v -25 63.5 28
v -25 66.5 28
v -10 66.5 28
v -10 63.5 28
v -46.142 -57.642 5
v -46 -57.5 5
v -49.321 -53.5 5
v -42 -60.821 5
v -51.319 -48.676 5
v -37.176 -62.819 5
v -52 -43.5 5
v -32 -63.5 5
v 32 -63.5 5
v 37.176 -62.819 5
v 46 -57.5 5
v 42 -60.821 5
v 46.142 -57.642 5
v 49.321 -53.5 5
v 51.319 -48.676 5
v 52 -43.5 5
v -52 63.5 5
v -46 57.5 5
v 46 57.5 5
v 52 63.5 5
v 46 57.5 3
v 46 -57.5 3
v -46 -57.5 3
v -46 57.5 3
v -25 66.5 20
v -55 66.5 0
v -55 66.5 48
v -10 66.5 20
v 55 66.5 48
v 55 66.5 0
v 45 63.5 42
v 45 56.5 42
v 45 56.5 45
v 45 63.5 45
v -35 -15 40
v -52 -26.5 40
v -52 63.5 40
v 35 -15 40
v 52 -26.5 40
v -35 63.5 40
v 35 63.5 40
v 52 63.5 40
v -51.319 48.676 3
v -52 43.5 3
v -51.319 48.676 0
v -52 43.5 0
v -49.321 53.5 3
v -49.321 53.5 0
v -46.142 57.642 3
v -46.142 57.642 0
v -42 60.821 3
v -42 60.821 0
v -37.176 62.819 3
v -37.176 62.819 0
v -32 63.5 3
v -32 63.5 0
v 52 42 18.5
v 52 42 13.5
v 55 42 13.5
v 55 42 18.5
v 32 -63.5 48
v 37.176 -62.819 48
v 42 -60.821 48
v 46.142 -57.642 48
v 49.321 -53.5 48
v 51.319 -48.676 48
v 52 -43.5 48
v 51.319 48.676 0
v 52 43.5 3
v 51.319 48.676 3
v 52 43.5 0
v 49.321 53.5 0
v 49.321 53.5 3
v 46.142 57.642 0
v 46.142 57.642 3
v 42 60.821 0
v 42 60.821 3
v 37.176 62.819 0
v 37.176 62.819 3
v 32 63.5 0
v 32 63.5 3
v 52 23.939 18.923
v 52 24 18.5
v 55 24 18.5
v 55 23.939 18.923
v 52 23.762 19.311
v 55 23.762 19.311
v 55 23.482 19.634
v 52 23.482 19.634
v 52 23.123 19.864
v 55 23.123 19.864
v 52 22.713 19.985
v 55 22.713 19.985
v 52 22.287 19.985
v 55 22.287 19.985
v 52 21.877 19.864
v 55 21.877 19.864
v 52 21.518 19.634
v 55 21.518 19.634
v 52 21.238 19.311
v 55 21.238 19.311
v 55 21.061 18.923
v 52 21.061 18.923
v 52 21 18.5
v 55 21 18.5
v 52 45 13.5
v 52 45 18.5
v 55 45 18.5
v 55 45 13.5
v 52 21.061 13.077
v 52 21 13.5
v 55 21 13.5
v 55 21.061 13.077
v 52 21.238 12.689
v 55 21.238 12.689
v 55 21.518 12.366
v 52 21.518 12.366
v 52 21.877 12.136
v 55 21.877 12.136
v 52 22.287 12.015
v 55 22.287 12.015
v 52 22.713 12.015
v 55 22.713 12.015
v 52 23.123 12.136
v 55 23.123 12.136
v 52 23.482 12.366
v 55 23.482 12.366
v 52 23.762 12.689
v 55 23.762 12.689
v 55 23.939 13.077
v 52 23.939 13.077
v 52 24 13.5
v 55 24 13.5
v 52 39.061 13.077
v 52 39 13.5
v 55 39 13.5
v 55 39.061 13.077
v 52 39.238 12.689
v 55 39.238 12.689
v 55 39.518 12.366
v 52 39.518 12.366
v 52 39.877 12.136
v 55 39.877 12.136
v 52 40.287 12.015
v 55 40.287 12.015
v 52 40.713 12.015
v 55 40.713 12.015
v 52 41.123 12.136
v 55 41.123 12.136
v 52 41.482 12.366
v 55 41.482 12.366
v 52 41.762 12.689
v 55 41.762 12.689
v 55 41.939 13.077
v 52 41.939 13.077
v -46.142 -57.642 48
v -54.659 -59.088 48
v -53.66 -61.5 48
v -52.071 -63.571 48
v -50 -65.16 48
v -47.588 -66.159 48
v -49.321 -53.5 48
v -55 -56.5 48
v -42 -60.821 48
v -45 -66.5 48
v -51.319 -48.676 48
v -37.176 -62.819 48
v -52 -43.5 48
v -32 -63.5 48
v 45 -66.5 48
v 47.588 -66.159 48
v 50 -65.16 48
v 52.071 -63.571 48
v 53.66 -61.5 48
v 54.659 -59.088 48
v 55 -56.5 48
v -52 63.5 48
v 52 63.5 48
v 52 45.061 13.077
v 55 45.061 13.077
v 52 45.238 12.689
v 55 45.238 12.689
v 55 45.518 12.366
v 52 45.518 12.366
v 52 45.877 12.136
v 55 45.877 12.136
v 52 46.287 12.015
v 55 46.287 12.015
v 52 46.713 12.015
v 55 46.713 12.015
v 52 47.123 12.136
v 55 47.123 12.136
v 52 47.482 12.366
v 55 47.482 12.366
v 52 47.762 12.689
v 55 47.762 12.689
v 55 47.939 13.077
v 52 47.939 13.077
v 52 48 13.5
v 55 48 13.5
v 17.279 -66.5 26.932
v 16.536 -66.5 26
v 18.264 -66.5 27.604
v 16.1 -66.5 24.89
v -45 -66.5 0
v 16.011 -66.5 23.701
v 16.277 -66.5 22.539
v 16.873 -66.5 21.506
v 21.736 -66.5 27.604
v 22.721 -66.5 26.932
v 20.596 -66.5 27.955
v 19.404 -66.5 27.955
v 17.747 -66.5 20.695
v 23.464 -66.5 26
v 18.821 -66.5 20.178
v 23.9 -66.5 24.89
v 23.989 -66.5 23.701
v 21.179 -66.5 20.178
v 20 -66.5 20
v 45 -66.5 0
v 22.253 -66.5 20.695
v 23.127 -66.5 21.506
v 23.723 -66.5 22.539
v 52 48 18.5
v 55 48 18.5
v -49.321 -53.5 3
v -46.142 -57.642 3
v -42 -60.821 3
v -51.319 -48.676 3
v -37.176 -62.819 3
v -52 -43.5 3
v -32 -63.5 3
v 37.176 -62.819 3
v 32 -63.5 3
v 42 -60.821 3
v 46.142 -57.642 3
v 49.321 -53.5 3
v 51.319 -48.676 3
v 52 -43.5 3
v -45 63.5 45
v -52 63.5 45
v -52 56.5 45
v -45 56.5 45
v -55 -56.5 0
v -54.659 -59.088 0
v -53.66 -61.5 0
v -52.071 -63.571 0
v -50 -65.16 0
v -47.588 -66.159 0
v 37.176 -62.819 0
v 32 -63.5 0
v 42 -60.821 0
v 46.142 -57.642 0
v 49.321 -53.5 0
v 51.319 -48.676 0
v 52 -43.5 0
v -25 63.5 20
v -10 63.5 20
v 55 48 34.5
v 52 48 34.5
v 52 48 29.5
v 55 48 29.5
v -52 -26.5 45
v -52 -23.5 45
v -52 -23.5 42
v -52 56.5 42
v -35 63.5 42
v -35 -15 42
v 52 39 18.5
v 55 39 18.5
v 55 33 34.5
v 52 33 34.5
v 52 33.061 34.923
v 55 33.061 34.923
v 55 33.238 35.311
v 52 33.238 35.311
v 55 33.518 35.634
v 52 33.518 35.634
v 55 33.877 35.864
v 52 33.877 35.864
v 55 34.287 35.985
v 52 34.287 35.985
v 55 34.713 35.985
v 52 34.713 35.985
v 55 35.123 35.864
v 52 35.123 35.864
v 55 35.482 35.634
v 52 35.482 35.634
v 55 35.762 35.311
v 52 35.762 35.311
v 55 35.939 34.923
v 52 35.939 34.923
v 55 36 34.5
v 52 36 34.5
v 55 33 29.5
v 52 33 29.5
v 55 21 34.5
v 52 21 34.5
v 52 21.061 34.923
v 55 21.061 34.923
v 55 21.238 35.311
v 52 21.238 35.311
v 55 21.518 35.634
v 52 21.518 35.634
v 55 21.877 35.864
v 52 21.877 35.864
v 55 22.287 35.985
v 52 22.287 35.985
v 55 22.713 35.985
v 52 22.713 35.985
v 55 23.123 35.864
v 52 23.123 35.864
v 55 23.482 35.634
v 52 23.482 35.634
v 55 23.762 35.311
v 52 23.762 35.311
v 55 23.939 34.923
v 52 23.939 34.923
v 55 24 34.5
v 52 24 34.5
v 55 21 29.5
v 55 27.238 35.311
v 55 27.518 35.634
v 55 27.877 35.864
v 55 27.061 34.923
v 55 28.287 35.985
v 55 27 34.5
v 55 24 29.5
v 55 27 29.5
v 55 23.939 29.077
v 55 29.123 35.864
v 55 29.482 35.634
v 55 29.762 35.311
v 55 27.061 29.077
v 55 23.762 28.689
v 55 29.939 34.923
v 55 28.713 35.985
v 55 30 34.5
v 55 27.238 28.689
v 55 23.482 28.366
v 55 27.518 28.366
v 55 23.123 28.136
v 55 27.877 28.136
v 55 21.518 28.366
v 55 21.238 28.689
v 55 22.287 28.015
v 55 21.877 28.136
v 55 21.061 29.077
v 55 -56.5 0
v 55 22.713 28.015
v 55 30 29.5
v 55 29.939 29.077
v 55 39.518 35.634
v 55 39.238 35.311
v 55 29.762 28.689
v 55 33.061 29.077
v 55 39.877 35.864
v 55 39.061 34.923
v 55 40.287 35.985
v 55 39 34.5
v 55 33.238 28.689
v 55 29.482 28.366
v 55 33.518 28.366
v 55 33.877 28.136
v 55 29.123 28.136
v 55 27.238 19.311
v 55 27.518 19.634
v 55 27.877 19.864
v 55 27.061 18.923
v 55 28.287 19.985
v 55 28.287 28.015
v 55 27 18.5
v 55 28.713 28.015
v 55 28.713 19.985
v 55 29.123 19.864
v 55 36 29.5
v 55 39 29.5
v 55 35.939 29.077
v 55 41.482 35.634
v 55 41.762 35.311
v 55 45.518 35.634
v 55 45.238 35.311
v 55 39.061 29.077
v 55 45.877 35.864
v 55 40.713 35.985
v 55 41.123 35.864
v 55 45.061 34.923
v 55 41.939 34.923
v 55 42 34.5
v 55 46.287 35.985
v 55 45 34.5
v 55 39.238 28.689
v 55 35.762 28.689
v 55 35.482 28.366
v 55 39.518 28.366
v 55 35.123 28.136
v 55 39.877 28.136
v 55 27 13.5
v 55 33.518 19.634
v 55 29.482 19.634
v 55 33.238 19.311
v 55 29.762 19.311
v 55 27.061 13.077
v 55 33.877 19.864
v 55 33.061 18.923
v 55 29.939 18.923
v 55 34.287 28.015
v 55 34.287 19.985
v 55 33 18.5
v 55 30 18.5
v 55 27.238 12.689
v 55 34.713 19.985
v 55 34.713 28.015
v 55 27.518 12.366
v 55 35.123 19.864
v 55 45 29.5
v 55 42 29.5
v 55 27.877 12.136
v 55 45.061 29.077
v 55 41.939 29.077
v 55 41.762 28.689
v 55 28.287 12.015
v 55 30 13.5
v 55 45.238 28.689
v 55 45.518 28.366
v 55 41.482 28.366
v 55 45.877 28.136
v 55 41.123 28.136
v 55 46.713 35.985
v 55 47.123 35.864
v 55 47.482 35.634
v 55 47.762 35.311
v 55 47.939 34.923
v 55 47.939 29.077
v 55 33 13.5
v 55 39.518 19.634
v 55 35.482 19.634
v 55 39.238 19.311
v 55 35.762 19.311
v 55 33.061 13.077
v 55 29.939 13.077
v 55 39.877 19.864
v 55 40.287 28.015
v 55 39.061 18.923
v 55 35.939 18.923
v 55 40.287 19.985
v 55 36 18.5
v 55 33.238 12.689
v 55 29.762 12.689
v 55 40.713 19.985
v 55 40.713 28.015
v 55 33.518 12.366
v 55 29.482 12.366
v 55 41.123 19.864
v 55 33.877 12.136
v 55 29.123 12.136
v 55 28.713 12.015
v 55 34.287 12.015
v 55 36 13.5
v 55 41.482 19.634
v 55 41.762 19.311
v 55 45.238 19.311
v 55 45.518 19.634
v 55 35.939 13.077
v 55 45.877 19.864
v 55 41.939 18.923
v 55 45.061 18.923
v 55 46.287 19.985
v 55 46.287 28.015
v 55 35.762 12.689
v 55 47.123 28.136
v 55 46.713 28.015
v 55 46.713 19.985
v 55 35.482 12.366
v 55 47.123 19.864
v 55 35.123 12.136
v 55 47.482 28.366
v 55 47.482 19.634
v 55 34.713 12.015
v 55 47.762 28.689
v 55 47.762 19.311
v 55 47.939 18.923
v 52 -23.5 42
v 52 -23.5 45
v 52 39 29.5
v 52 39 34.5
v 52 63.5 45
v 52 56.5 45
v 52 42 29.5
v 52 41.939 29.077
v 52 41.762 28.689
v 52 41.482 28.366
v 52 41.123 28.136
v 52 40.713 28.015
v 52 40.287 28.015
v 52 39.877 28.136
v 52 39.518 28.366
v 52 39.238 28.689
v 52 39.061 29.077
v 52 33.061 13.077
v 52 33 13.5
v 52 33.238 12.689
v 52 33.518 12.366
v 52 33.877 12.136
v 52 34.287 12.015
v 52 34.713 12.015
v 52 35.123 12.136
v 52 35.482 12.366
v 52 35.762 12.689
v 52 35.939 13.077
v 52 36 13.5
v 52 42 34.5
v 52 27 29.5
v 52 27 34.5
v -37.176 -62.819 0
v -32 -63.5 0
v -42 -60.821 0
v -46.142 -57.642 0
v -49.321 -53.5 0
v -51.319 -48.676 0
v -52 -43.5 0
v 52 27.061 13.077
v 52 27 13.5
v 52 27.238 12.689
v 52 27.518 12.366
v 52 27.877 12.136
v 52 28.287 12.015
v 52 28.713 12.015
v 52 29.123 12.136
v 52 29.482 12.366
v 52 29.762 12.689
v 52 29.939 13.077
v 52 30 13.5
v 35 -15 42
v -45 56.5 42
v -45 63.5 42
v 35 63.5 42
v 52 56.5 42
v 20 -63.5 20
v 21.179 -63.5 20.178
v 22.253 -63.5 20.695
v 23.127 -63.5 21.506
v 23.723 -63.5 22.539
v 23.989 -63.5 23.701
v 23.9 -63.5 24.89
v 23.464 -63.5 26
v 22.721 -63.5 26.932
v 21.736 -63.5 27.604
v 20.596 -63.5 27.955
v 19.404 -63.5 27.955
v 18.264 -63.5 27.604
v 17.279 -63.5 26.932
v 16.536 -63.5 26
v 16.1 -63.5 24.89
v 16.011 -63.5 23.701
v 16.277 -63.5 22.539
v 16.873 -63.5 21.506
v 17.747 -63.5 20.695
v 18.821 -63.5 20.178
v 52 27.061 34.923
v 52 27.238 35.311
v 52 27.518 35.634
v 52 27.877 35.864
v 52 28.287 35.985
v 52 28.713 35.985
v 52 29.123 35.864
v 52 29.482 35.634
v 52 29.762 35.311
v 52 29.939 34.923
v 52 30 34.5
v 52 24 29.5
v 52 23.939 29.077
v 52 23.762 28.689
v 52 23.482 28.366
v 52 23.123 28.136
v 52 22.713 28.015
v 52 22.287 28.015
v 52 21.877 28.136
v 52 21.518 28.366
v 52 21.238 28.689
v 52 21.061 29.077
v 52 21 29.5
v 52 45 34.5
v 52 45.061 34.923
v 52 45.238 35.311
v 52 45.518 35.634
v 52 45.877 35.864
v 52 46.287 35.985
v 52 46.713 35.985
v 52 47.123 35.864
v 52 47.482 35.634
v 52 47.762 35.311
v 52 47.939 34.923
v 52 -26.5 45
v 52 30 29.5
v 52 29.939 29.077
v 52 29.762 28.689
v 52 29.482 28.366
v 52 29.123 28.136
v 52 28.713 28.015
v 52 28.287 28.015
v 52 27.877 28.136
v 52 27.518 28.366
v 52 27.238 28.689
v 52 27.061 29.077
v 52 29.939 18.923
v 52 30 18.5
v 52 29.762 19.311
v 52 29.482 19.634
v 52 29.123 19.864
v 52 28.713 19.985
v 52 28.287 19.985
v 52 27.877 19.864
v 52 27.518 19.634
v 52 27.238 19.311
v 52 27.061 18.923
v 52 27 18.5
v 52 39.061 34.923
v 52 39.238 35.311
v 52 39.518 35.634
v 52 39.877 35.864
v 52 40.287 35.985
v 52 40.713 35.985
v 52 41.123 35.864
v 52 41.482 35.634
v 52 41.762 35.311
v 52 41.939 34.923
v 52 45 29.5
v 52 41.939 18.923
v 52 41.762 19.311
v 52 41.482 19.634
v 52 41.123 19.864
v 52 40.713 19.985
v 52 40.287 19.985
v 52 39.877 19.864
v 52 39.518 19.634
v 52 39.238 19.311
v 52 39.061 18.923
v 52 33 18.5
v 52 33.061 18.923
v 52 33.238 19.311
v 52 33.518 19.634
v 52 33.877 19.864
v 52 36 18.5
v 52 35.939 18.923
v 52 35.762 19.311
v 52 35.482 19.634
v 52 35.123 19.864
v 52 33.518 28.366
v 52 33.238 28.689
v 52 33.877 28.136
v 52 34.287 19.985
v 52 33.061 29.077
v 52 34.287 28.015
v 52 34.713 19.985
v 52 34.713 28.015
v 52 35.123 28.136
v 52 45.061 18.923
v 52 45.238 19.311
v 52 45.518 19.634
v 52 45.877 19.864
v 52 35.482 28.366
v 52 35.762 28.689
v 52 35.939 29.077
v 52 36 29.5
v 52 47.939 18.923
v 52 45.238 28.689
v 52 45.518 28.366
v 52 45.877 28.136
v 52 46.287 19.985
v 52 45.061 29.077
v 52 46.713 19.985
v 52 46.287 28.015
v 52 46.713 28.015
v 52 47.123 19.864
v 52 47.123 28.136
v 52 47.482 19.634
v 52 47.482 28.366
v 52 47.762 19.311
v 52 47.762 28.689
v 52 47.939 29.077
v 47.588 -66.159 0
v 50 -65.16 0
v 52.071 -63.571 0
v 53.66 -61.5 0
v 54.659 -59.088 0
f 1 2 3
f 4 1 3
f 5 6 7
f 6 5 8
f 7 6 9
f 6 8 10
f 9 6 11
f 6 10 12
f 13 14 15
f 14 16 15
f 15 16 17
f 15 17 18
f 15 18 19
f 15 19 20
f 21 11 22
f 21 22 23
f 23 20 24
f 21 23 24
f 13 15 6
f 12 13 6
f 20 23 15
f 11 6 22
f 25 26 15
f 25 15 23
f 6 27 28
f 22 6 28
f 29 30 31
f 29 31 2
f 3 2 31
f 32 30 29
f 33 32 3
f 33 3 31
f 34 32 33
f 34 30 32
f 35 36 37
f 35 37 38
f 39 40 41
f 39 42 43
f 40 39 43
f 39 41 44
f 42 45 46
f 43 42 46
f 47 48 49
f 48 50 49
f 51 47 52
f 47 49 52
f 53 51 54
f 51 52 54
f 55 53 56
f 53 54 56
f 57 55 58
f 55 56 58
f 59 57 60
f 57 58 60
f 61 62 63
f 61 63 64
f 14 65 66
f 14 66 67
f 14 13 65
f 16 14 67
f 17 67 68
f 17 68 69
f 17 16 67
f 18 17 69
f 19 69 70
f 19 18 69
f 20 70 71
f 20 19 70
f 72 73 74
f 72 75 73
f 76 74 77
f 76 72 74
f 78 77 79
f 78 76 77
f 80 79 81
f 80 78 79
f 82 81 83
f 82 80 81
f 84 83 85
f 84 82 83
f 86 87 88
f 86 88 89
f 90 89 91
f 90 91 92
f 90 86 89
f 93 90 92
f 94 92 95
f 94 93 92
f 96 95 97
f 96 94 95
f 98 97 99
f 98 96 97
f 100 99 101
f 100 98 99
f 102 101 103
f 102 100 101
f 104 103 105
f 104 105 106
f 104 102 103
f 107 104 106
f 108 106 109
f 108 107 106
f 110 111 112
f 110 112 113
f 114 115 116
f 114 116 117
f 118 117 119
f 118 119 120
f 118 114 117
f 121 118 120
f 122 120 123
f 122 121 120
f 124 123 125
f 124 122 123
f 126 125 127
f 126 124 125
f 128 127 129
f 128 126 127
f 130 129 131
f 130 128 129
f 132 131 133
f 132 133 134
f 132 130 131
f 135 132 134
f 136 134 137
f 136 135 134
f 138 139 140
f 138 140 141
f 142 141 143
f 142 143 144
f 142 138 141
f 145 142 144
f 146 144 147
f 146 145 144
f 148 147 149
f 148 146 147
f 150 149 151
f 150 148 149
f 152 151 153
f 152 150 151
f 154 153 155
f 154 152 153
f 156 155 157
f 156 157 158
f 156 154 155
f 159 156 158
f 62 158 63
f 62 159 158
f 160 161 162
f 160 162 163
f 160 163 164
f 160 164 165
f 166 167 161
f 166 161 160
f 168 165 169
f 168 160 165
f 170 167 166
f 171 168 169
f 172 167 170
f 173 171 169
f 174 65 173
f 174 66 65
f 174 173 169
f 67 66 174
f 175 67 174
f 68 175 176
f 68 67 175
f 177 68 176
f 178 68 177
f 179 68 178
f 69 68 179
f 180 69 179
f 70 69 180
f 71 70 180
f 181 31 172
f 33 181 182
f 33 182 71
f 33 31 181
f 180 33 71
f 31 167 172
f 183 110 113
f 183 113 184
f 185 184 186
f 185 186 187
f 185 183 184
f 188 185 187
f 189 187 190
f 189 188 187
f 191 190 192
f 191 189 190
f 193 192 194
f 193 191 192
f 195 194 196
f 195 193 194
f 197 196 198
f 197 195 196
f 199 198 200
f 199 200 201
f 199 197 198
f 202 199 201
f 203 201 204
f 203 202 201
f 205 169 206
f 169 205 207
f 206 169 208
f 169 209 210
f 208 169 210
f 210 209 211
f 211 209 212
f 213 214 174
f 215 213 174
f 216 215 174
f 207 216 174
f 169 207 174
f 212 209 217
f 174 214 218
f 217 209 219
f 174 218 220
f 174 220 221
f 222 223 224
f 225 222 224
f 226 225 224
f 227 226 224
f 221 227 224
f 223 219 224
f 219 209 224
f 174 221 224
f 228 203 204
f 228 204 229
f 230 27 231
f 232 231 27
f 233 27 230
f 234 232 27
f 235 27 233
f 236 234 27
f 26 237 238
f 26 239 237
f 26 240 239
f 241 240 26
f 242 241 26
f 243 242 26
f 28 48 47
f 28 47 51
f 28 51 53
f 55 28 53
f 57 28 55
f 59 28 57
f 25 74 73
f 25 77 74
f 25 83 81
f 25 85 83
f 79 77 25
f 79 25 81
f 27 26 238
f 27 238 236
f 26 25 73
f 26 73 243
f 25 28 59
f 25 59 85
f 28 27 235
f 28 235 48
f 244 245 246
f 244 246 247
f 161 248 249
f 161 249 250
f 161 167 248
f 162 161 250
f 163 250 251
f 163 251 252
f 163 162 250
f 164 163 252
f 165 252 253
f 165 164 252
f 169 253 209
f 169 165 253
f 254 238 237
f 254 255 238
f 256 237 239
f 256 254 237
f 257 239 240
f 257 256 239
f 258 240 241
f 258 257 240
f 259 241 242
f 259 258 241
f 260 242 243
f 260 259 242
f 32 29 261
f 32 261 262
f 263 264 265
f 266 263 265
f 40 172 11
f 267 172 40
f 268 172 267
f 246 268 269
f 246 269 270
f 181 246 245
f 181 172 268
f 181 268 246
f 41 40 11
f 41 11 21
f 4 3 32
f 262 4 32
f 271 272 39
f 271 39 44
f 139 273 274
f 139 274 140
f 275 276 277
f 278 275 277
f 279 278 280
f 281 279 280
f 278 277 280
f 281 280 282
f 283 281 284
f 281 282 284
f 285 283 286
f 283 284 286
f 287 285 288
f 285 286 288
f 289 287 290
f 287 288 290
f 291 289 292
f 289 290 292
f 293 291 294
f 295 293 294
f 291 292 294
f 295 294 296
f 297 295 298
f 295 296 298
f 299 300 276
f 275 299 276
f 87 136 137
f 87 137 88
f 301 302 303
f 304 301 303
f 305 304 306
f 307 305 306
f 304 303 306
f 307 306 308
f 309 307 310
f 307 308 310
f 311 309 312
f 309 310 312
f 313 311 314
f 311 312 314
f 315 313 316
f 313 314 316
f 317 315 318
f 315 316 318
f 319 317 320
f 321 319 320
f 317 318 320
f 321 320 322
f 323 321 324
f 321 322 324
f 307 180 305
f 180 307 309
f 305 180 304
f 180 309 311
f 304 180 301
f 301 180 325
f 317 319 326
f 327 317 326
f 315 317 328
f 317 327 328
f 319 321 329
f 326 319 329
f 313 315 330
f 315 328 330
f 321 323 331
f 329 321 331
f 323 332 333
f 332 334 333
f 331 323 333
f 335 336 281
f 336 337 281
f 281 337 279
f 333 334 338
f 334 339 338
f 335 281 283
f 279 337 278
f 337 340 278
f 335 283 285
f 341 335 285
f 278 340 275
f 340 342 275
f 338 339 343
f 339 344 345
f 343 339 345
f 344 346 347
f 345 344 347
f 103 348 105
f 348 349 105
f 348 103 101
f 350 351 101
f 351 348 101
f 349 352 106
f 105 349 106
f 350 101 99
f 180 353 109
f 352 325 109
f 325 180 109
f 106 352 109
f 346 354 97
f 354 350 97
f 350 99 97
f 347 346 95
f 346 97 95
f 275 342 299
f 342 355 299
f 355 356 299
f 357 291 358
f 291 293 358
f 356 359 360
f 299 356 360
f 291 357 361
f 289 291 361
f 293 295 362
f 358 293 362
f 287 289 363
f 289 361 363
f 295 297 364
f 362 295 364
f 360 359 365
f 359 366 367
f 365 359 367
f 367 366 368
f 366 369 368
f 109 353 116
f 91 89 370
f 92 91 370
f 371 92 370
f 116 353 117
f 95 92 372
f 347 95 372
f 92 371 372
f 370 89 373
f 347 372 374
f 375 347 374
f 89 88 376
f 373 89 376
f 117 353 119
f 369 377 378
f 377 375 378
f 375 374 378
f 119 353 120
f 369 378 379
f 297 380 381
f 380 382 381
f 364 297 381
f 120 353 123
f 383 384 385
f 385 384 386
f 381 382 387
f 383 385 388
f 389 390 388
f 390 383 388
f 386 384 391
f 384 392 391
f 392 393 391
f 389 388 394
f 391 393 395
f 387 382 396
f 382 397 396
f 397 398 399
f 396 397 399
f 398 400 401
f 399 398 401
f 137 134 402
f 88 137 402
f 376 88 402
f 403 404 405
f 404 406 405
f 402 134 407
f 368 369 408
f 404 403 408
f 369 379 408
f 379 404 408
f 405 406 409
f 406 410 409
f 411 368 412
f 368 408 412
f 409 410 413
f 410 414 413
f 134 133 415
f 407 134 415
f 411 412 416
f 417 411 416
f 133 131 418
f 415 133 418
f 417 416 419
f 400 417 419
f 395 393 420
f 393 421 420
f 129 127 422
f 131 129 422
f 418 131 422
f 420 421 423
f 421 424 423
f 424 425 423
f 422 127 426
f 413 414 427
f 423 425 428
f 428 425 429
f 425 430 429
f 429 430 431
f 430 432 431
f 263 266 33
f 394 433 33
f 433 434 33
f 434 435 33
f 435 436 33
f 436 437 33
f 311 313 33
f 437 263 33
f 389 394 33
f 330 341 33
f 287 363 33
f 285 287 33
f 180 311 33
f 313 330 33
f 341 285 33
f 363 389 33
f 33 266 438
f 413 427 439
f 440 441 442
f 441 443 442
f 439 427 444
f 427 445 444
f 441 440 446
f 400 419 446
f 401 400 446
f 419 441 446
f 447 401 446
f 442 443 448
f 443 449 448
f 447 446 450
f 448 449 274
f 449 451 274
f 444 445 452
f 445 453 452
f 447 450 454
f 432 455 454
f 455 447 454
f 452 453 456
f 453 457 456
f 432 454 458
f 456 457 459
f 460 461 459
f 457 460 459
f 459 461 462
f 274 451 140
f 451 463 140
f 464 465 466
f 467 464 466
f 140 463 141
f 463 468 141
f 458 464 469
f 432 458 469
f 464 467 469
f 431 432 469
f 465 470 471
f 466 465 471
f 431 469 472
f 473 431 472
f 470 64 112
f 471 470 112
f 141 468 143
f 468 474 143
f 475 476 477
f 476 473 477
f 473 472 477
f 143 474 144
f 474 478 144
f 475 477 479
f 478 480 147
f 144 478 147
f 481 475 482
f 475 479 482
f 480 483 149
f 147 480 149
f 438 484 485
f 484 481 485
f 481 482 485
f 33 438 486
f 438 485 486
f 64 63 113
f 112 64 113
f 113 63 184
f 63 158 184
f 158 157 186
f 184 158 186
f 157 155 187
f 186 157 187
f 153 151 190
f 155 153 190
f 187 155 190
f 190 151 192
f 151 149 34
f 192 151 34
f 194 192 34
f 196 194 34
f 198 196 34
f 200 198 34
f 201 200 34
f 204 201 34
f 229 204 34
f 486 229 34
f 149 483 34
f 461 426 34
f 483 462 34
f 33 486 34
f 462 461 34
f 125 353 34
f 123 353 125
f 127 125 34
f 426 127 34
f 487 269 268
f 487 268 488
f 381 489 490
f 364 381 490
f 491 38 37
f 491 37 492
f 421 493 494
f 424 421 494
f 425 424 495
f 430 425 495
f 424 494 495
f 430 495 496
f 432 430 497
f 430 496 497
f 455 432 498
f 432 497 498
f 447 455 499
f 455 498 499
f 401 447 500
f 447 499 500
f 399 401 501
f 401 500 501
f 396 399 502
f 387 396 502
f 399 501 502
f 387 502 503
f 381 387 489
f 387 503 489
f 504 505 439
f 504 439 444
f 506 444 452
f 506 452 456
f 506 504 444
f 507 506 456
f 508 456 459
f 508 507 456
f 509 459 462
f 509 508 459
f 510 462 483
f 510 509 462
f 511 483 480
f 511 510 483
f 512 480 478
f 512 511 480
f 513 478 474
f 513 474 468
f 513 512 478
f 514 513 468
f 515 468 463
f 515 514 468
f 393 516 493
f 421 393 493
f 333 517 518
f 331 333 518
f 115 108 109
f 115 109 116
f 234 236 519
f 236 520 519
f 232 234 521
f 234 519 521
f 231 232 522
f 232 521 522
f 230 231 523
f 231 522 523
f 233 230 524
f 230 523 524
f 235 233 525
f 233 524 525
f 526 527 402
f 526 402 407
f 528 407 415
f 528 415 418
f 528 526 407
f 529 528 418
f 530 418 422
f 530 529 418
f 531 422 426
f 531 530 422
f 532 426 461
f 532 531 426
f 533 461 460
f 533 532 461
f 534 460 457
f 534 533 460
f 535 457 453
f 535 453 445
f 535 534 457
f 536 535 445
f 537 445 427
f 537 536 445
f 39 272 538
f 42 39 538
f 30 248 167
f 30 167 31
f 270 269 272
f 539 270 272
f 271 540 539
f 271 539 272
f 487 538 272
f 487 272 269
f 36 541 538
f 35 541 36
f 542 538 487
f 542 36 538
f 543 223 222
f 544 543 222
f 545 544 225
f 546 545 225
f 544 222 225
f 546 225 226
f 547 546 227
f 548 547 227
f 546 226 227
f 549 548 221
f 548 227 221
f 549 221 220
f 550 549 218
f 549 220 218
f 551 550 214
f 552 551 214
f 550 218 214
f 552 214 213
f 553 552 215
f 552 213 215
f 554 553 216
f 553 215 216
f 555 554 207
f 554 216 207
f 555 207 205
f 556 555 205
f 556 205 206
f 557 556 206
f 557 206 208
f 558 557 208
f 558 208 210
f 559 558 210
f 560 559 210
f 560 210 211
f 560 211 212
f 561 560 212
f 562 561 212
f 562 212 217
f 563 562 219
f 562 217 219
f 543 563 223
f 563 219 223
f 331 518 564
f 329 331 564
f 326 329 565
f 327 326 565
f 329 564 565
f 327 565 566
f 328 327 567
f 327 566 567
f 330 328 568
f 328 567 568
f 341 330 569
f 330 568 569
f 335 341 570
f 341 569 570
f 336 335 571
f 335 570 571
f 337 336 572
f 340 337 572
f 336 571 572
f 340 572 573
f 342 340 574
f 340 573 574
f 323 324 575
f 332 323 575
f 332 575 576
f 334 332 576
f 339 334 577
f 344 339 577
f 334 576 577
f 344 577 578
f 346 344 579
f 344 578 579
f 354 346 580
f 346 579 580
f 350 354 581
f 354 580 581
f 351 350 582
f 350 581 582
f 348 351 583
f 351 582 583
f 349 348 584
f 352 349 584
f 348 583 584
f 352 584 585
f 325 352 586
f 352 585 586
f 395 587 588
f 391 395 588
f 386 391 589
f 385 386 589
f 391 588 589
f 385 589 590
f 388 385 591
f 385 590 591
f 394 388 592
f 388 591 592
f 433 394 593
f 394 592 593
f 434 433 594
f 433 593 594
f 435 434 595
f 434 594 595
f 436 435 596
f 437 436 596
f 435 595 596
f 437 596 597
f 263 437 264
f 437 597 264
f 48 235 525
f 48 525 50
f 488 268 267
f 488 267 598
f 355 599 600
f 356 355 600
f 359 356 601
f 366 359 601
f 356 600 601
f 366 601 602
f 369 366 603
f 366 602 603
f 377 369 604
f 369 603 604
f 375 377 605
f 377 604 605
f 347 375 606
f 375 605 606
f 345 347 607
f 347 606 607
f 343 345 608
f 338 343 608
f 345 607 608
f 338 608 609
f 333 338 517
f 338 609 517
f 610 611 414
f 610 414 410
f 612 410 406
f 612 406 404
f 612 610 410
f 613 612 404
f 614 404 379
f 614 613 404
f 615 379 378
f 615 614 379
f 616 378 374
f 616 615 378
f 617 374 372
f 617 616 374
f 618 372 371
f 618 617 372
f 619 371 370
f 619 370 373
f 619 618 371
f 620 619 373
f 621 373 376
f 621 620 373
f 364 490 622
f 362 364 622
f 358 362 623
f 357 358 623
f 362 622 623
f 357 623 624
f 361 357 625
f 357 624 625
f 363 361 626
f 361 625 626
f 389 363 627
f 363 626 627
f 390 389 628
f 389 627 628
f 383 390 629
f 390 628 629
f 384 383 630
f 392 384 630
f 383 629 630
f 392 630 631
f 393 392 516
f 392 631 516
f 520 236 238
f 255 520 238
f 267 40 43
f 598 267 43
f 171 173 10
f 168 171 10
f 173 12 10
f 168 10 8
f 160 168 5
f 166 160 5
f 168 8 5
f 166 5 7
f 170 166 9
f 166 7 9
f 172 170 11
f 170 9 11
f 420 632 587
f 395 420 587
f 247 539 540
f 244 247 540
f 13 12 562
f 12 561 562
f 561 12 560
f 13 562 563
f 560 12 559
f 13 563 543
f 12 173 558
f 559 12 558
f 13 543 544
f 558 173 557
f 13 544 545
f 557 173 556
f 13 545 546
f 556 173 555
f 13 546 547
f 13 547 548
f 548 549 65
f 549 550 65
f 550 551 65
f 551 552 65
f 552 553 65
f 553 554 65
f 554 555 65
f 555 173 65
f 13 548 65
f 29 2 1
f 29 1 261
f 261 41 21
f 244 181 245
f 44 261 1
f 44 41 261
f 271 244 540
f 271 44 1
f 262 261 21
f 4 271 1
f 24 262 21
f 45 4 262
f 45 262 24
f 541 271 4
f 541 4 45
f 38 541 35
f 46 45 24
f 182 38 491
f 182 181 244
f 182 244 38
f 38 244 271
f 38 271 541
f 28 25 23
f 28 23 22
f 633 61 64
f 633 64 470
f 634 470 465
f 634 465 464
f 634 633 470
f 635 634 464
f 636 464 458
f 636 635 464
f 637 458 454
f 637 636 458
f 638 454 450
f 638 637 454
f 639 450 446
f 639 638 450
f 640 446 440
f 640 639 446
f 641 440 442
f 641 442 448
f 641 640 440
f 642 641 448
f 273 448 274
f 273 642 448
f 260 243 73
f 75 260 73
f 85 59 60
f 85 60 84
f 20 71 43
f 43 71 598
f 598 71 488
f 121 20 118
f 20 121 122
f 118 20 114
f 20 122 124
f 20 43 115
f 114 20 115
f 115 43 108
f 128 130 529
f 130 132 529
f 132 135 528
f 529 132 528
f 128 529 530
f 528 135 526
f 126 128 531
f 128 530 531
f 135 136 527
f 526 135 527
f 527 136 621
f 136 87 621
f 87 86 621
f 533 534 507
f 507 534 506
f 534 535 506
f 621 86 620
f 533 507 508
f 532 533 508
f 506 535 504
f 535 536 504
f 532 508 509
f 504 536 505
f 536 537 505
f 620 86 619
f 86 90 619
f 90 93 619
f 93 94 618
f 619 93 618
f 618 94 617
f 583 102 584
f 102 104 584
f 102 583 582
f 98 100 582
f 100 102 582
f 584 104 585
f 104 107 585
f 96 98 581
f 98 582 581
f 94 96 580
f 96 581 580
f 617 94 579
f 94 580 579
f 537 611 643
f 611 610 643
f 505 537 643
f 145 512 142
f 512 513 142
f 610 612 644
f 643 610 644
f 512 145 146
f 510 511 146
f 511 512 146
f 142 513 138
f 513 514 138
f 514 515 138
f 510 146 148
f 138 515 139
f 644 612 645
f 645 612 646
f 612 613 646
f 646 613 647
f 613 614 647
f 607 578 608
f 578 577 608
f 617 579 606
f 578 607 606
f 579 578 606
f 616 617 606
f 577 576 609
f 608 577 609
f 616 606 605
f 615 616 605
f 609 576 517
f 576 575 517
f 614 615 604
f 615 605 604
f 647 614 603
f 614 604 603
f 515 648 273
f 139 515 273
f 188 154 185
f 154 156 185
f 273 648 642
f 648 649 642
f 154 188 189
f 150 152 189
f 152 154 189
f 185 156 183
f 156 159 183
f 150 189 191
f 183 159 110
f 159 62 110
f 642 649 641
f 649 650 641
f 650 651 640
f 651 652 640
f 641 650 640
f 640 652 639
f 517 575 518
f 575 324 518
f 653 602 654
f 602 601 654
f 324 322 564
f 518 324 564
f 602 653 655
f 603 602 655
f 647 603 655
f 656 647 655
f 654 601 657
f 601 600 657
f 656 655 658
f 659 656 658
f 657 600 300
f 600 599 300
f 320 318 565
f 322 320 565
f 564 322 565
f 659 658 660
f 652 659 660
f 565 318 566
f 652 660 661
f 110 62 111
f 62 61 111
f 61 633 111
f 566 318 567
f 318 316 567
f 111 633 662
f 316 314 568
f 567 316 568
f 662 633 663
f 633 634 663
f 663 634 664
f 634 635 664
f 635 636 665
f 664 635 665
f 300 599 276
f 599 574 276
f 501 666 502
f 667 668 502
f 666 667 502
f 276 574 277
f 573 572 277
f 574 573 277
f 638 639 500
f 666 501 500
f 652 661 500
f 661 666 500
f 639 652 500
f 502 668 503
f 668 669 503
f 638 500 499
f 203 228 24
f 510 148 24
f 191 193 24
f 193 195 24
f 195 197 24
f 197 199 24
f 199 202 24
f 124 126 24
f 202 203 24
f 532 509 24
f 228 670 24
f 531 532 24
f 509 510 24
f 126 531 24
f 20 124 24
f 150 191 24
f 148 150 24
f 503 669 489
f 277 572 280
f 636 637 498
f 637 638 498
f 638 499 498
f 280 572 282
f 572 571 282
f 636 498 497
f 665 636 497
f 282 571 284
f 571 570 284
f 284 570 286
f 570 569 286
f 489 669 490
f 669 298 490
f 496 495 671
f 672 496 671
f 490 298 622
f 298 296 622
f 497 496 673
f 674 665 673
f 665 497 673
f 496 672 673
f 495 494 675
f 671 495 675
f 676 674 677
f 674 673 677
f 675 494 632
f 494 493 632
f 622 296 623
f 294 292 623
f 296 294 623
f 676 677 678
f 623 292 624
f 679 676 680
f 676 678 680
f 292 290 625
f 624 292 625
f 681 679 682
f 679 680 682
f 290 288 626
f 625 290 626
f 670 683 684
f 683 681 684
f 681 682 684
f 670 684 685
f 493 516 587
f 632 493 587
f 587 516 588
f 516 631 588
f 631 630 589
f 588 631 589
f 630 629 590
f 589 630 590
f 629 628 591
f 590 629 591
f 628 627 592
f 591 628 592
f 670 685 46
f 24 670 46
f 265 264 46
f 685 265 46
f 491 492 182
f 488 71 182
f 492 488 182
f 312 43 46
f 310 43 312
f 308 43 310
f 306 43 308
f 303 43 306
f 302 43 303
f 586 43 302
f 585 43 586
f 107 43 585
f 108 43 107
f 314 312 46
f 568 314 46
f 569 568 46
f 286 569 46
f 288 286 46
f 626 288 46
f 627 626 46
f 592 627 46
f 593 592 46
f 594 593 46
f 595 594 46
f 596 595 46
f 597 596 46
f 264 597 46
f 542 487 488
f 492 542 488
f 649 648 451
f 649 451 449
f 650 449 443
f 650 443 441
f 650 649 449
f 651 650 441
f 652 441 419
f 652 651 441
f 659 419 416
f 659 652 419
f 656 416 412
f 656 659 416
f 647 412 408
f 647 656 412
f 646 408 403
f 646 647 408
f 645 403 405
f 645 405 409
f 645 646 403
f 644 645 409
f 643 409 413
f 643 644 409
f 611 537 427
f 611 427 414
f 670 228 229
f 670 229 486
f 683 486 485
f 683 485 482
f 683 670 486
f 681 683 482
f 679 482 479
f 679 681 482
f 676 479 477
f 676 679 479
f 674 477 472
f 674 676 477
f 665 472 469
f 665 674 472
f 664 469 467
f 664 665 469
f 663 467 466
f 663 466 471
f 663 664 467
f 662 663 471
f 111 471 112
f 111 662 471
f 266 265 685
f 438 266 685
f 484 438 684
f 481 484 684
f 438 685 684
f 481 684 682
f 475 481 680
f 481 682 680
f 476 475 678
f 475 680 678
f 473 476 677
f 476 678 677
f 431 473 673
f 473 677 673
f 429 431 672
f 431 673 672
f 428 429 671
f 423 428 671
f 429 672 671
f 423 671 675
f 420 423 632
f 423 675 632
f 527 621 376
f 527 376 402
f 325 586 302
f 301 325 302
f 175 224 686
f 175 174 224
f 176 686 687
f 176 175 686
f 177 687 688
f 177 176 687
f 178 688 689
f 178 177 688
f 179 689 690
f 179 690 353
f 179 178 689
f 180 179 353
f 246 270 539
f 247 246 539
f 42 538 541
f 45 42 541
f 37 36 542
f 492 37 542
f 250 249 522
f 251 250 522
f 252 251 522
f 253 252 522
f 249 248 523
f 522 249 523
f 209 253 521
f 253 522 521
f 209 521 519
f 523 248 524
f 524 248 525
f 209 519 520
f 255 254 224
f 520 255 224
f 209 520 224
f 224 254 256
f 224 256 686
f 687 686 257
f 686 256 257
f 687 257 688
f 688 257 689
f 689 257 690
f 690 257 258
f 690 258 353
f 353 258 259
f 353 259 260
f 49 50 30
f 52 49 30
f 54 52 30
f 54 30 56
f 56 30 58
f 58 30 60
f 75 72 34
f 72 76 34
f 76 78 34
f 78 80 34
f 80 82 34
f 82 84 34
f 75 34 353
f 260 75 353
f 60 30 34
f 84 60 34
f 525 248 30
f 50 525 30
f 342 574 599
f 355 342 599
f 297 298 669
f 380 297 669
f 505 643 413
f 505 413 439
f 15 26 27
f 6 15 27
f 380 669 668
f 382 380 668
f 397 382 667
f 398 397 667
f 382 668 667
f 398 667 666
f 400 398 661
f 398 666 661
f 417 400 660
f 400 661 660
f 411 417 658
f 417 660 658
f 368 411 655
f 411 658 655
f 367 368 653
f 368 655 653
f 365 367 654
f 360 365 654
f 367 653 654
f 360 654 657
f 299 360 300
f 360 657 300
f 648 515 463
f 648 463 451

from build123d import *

# Parameters (mm, degrees)
SKETCH_1_W          = 110
SKETCH_1_H          = 133
EXTRUDE_1_DEPTH     = 48
SKETCH_2_W          = 104
SKETCH_2_H          = 127
CUT_EXTRUDE_1_DEPTH = 50
SKETCH_3_W          = 104
SKETCH_3_H          = 2
EXTRUDE_2_DEPTH     = 90
CUT_EXTRUDE_2_REACH = 97.975
SKETCH_4_W          = 70
SKETCH_4_H          = 70
SKETCH_5_W          = 104
SKETCH_5_H          = 3
EXTRUDE_3_DEPTH     = 3
SKETCH_6_W          = 15
SKETCH_6_H          = 8
CUT_EXTRUDE_3_DEPTH = 10
SKETCH_8_W          = 70
SKETCH_8_H          = 8.5
CUT_EXTRUDE_4_DEPTH = 2
EXTRUDE_4_REACH     = 136.816
SKETCH_9_W          = 2
SKETCH_9_H          = 127
SKETCH_10_W         = 92
SKETCH_10_H         = 115
CUT_EXTRUDE_5_DEPTH = 8
FILLET_10_R         = 10
FILLET_11_R         = 20
FILLET_12_R         = 20
FILLET_13_R         = 10
FILLET_14_R         = 20
FILLET_15_R         = 20
FILLET_16_R         = 20
SKETCH_11_W         = 7
SKETCH_11_H         = 7
EXTRUDE_5_DEPTH     = 3
SKETCH_12_R         = 4
CUT_EXTRUDE_6_DEPTH = 3
CUT_EXTRUDE_7_DEPTH = 3


with BuildPart() as part:
    # 草图1 → 凸台-拉伸1 (new body)
    with BuildSketch(Plane.XY):
        Rectangle(SKETCH_1_W, SKETCH_1_H)
    extrude(amount=EXTRUDE_1_DEPTH)

    # 草图2 → 切除-拉伸1 (cut)
    with BuildSketch(Plane.XY.offset(48)):
        Rectangle(SKETCH_2_W, SKETCH_2_H)
    extrude(amount=-CUT_EXTRUDE_1_DEPTH, mode=Mode.SUBTRACT)

    # 草图3 → 凸台-拉伸2 (add)
    with BuildSketch(Plane.XZ.offset(-63.5)):
        with Locations((0, 41)):
            Rectangle(SKETCH_3_W, SKETCH_3_H)
    extrude(amount=EXTRUDE_2_DEPTH)

    # 草图4 → 切除-拉伸2 (cut, up to next)
    with BuildSketch(Plane.XY.offset(42), mode=Mode.PRIVATE) as cut_extrude_2_sk1:
        with Locations((0, 20)):
            Rectangle(SKETCH_4_W, SKETCH_4_H)
    cut_extrude_2_tool1 = extrude(cut_extrude_2_sk1.sketch, amount=-CUT_EXTRUDE_2_REACH, mode=Mode.PRIVATE) & part.part
    add(cut_extrude_2_tool1.solids().sort_by_distance((0, 20, 42))[0], mode=Mode.SUBTRACT)

    # 草图5 → 凸台-拉伸3 (add)
    with BuildSketch(Plane.XY.offset(42)):
        with Locations((0, -25)):
            Rectangle(SKETCH_5_W, SKETCH_5_H)
    extrude(amount=EXTRUDE_3_DEPTH)

    # 草图6 → 切除-拉伸3 (cut)
    with BuildSketch(Plane(origin=(0, 66.5, 0), x_dir=(1, 0, 0), z_dir=(0, 1, 0))):
        with Locations((-17.5, -24)):
            Rectangle(SKETCH_6_W, SKETCH_6_H)
    extrude(amount=-CUT_EXTRUDE_3_DEPTH, mode=Mode.SUBTRACT)

    # 草图8 → 切除-拉伸4 (cut)
    with BuildSketch(Plane.XY.offset(42)):
        with Locations((0, 59.25)):
            Rectangle(SKETCH_8_W, SKETCH_8_H)
    extrude(amount=-CUT_EXTRUDE_4_DEPTH, mode=Mode.SUBTRACT)

    # 草图9 → 凸台-拉伸4 (add, up to next)
    with BuildSketch(Plane.ZY.offset(-52), mode=Mode.PRIVATE) as extrude_4_sk1:
        with Locations((4, 0)):
            Rectangle(SKETCH_9_W, SKETCH_9_H)
    extrude_4_tool1 = extrude(extrude_4_sk1.sketch, amount=EXTRUDE_4_REACH, mode=Mode.PRIVATE) - part.part
    add(extrude_4_tool1.solids().sort_by_distance((52, 0, 4))[0])

    # 草图10 → 切除-拉伸5 (cut)
    with BuildSketch(Plane(origin=(0, 0, 3), x_dir=(-1, 0, 0), z_dir=(0, 0, -1))):
        Rectangle(SKETCH_10_W, SKETCH_10_H)
    extrude(amount=-CUT_EXTRUDE_5_DEPTH, mode=Mode.SUBTRACT)

    # 圆角10
    fillet_10_edges = [part.edges().sort_by_distance(p)[0] for p in [
        (-55, -66.5, 24),
    ]]
    fillet(fillet_10_edges, radius=FILLET_10_R)

    # 圆角11
    fillet_11_edges = [part.edges().sort_by_distance(p)[0] for p in [
        (-52, -63.5, 1.5),
    ]]
    fillet(fillet_11_edges, radius=FILLET_11_R)

    # 圆角12
    fillet_12_edges = [part.edges().sort_by_distance(p)[0] for p in [
        (52, -63.5, 1.5),
    ]]
    fillet(fillet_12_edges, radius=FILLET_12_R)

    # 圆角13
    fillet_13_edges = [part.edges().sort_by_distance(p)[0] for p in [
        (55, -66.5, 24),
    ]]
    fillet(fillet_13_edges, radius=FILLET_13_R)

    # 圆角14
    fillet_14_edges = [part.edges().sort_by_distance(p)[0] for p in [
        (-52, 63.5, 1.5),
        (52, 63.5, 1.5),
    ]]
    fillet(fillet_14_edges, radius=FILLET_14_R)

    # 圆角15
    fillet_15_edges = [part.edges().sort_by_distance(p)[0] for p in [
        (52, -63.5, 26.5),
    ]]
    fillet(fillet_15_edges, radius=FILLET_15_R)

    # 圆角16
    fillet_16_edges = [part.edges().sort_by_distance(p)[0] for p in [
        (-52, -63.5, 26.5),
    ]]
    fillet(fillet_16_edges, radius=FILLET_16_R)

    # 草图11 → 凸台-拉伸5 (add)
    with BuildSketch(Plane.XY.offset(42)):
        with Locations((48.5, 60)):
            Rectangle(SKETCH_11_W, SKETCH_11_H)
        with Locations((-48.5, 60)):
            Rectangle(SKETCH_11_W, SKETCH_11_H)
    extrude(amount=EXTRUDE_5_DEPTH)

    # 草图12 → 切除-拉伸6 (cut)
    with BuildSketch(Plane.XZ.offset(66.5)):
        with Locations(Location((20, 24, 0), (0, 0, 270))):
            Circle(SKETCH_12_R)
    extrude(amount=-CUT_EXTRUDE_6_DEPTH, mode=Mode.SUBTRACT)

    # 草图13 → 切除-拉伸7 (cut)
    with BuildSketch(Plane.ZY.offset(-52)):
        with BuildLine():
            Line((13.5, 48), (18.5, 48))
            ThreePointArc((18.5, 48), (20, 46.5), (18.5, 45))
            Line((18.5, 45), (13.5, 45))
            ThreePointArc((13.5, 45), (12, 46.5), (13.5, 48))
        make_face()
        with BuildLine():
            Line((34.5, 48), (29.5, 48))
            ThreePointArc((29.5, 48), (28, 46.5), (29.5, 45))
            Line((29.5, 45), (34.5, 45))
            ThreePointArc((34.5, 45), (36, 46.5), (34.5, 48))
        make_face()
        with BuildLine():
            Line((13.5, 42), (18.5, 42))
            ThreePointArc((18.5, 42), (20, 40.5), (18.5, 39))
            Line((18.5, 39), (13.5, 39))
            ThreePointArc((13.5, 39), (12, 40.5), (13.5, 42))
        make_face()
        with BuildLine():
            Line((13.5, 36), (18.5, 36))
            ThreePointArc((18.5, 36), (20, 34.5), (18.5, 33))
            Line((18.5, 33), (13.5, 33))
            ThreePointArc((13.5, 33), (12, 34.5), (13.5, 36))
        make_face()
        with BuildLine():
            Line((13.5, 30), (18.5, 30))
            ThreePointArc((18.5, 30), (20, 28.5), (18.5, 27))
            Line((18.5, 27), (13.5, 27))
            ThreePointArc((13.5, 27), (12, 28.5), (13.5, 30))
        make_face()
        with BuildLine():
            Line((13.5, 24), (18.5, 24))
            ThreePointArc((18.5, 24), (20, 22.5), (18.5, 21))
            Line((18.5, 21), (13.5, 21))
            ThreePointArc((13.5, 21), (12, 22.5), (13.5, 24))
        make_face()
        with BuildLine():
            Line((34.5, 24), (29.5, 24))
            ThreePointArc((29.5, 24), (28, 22.5), (29.5, 21))
            Line((29.5, 21), (34.5, 21))
            ThreePointArc((34.5, 21), (36, 22.5), (34.5, 24))
        make_face()
        with BuildLine():
            Line((34.5, 30), (29.5, 30))
            ThreePointArc((29.5, 30), (28, 28.5), (29.5, 27))
            Line((29.5, 27), (34.5, 27))
            ThreePointArc((34.5, 27), (36, 28.5), (34.5, 30))
        make_face()
        with BuildLine():
            Line((34.5, 36), (29.5, 36))
            ThreePointArc((29.5, 36), (28, 34.5), (29.5, 33))
            Line((29.5, 33), (34.5, 33))
            ThreePointArc((34.5, 33), (36, 34.5), (34.5, 36))
        make_face()
        with BuildLine():
            Line((34.5, 42), (29.5, 42))
            ThreePointArc((29.5, 42), (28, 40.5), (29.5, 39))
            Line((29.5, 39), (34.5, 39))
            ThreePointArc((34.5, 39), (36, 40.5), (34.5, 42))
        make_face()
    extrude(amount=-CUT_EXTRUDE_7_DEPTH, mode=Mode.SUBTRACT)


solid = part.part
